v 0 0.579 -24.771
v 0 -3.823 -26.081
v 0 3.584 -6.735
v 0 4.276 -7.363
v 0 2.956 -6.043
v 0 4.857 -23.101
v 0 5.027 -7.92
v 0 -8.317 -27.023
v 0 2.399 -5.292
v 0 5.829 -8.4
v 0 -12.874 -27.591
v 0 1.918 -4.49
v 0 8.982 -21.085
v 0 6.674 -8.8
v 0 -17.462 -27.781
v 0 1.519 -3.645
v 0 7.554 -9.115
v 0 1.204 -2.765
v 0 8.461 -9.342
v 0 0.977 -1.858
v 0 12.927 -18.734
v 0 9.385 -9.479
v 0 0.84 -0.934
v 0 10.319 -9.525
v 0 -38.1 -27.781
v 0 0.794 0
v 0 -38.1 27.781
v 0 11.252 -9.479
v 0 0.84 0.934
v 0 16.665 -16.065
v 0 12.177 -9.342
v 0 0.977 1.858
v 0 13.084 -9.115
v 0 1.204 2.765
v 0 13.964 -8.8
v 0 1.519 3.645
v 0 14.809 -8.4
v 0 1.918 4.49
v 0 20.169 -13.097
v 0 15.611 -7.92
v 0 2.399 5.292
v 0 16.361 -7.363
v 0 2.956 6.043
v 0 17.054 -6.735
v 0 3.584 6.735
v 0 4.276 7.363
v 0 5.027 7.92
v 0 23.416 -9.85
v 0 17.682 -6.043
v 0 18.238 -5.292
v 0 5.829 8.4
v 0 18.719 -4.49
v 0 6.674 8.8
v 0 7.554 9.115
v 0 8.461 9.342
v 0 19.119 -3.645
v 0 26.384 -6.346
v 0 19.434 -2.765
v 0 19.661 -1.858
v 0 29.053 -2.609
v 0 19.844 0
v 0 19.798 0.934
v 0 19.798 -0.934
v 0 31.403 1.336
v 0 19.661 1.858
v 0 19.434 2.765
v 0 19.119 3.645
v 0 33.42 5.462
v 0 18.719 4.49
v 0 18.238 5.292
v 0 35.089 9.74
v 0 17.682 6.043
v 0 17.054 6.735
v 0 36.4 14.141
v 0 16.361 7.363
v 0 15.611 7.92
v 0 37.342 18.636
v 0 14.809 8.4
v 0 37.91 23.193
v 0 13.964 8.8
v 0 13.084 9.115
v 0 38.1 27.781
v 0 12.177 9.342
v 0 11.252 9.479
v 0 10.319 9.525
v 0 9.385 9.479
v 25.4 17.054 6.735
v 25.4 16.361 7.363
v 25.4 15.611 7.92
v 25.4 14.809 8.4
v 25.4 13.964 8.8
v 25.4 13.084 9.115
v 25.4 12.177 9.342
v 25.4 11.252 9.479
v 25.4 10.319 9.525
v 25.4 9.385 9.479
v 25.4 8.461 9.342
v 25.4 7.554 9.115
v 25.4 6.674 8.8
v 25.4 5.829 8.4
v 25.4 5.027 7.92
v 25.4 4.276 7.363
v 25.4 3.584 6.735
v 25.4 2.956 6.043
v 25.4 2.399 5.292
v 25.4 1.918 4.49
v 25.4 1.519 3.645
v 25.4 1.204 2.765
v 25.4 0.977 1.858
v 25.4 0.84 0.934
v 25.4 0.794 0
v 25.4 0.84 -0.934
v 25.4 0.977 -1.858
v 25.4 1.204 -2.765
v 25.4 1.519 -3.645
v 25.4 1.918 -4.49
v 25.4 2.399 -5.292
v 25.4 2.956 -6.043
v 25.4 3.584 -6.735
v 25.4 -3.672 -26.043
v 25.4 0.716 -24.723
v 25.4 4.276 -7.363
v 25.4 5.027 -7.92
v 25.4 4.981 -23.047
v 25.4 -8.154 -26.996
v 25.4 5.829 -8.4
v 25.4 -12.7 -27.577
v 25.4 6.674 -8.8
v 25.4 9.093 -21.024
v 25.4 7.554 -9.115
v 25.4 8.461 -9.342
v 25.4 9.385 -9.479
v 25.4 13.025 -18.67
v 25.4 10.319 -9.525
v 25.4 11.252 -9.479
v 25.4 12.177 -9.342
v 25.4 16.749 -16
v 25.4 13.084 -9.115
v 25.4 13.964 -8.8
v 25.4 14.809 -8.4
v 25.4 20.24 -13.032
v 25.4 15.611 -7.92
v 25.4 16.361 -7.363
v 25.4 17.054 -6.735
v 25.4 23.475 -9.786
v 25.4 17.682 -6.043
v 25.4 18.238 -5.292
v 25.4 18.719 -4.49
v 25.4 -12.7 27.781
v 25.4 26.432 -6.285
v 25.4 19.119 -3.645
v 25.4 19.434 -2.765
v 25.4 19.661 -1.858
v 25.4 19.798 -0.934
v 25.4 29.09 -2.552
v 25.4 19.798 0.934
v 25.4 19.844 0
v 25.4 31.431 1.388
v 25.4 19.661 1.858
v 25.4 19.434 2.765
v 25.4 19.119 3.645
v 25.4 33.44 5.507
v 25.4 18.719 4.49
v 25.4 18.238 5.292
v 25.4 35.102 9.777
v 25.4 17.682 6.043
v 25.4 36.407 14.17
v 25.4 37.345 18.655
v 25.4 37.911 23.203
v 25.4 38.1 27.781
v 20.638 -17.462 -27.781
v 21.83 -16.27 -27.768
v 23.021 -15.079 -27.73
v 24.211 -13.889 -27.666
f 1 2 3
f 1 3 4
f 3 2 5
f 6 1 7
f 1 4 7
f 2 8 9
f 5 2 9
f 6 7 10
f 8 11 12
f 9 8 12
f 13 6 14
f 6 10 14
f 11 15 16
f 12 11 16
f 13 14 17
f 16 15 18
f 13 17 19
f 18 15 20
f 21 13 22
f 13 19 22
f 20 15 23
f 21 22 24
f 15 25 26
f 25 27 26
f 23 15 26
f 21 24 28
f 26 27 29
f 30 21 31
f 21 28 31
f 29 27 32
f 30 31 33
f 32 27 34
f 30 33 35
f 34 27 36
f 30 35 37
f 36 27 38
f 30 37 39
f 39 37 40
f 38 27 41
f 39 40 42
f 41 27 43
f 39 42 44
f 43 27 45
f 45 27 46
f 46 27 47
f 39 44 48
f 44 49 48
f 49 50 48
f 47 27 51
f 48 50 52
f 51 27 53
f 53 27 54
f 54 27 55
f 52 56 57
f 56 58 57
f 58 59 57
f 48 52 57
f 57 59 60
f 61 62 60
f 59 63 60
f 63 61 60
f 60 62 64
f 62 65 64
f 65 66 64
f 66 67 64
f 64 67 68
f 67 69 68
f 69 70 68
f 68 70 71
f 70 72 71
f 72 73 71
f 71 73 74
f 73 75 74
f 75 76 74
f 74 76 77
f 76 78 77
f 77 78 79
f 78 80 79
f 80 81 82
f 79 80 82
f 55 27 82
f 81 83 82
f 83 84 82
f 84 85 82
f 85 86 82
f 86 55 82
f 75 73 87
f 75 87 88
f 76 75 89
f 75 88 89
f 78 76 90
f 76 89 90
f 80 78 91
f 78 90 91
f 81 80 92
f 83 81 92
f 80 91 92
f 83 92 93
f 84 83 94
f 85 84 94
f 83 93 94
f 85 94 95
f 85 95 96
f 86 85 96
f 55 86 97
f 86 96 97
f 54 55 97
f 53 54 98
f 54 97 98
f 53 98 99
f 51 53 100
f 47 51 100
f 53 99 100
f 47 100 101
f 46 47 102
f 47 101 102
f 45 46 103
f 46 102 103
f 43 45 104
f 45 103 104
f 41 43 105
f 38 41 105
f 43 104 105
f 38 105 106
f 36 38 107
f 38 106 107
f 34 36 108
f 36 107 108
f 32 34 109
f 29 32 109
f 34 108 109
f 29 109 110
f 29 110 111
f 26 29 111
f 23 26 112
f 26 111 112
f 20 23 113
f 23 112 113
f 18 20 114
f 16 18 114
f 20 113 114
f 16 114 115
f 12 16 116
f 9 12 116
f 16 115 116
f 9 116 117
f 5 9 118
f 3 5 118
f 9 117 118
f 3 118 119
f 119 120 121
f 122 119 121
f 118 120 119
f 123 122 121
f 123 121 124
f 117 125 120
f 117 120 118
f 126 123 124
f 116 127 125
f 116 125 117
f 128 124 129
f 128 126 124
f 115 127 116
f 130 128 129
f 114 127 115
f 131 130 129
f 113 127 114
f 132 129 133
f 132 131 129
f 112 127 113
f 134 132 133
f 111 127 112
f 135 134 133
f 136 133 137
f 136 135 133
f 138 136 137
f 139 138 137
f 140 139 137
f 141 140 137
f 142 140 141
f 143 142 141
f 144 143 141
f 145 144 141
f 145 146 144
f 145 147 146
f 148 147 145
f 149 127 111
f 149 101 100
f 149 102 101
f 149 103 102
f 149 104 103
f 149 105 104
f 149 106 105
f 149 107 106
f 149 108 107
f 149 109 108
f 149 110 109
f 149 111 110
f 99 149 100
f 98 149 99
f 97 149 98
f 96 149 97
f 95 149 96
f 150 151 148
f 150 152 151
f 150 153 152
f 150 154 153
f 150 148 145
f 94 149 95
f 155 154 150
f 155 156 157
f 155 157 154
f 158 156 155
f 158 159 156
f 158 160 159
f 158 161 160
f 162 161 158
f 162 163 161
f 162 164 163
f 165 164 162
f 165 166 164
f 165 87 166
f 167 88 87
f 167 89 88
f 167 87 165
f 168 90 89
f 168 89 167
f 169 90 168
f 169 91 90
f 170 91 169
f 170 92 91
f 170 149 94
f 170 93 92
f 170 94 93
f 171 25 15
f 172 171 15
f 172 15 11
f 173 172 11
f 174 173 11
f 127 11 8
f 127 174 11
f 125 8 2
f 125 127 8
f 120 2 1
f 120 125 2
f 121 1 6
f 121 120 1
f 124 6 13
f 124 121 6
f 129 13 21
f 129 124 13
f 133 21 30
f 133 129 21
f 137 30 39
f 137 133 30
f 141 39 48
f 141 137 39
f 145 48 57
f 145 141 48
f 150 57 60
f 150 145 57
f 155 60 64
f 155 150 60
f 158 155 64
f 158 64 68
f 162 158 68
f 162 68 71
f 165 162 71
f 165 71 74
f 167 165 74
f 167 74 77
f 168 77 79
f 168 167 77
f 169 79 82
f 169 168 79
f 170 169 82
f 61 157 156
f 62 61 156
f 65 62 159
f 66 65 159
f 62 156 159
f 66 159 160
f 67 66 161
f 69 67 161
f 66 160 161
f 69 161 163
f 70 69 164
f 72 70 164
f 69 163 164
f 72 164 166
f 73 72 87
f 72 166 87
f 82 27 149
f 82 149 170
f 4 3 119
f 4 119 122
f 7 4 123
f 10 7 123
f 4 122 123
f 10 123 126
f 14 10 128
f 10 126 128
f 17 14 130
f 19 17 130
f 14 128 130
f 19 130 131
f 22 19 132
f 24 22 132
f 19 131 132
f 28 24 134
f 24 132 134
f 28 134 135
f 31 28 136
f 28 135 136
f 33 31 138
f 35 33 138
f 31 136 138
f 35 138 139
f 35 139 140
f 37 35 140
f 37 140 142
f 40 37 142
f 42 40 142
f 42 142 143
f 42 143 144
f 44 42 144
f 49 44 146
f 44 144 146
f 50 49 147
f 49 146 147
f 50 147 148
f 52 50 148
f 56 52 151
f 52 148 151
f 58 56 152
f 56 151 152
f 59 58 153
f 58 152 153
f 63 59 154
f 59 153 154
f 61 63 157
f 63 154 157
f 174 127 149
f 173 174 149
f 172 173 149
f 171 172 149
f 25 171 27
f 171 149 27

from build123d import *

# Parameters (mm, degrees)
F0_W     = 76.2
F0_H     = 55.5625
F1_DEPTH = 25.4
F2_R     = 55.56249
F4_DEPTH = 25.4
F6_DEPTH = 55.5635


# Not quite as in the source:
# - a fillet or chamfer is up to 0.001 mm smaller than in the source, because OpenCascade refuses the exact size


with BuildPart() as f1:
    # F0 (on Right) → F1 (new body)
    with BuildSketch(Plane.YZ):
        Rectangle(F0_W, F0_H)
    extrude(amount=F1_DEPTH)

    # F2 (radius 55.5625 in the source; OpenCascade refuses exactly that, so slightly less here)
    f2_edges = [f1.edges().sort_by_distance(p)[0] for p in [
        (12.7, 38.1, -27.78125),
    ]]
    fillet(f2_edges, radius=F2_R)

    # F3 (on face) → F4 (cut)
    with BuildSketch(Plane.YZ.offset(25.4)):
        with BuildLine():
            ThreePointArc((17.0539420908, 6.7351920908), (3.5835579092, 6.7351920908), (3.5835579092, -6.7351920908))
            Line((3.5835579092, -6.7351920908), (17.0539420908, 6.7351920908))
        make_face()
        with BuildLine():
            Line((17.0539420908, 6.7351920908), (3.5835579092, -6.7351920908))
            ThreePointArc((3.5835579092, -6.7351920908), (13.9638096933, -8.7999525472), (19.84375, 0))
            ThreePointArc((19.84375, 0), (19.1187025472, 3.6450596933), (17.0539420908, 6.7351920908))
        make_face()
    extrude(amount=-F4_DEPTH, mode=Mode.SUBTRACT)

    # F5 (on face) → F6 (cut, through all)
    with BuildSketch(Plane.XY.offset(27.78125)):
        Polygon((25.4, -12.7), (0, -38.1), (25.4, -38.1), align=None)
    extrude(amount=-F6_DEPTH, mode=Mode.SUBTRACT)


solid = f1.part
